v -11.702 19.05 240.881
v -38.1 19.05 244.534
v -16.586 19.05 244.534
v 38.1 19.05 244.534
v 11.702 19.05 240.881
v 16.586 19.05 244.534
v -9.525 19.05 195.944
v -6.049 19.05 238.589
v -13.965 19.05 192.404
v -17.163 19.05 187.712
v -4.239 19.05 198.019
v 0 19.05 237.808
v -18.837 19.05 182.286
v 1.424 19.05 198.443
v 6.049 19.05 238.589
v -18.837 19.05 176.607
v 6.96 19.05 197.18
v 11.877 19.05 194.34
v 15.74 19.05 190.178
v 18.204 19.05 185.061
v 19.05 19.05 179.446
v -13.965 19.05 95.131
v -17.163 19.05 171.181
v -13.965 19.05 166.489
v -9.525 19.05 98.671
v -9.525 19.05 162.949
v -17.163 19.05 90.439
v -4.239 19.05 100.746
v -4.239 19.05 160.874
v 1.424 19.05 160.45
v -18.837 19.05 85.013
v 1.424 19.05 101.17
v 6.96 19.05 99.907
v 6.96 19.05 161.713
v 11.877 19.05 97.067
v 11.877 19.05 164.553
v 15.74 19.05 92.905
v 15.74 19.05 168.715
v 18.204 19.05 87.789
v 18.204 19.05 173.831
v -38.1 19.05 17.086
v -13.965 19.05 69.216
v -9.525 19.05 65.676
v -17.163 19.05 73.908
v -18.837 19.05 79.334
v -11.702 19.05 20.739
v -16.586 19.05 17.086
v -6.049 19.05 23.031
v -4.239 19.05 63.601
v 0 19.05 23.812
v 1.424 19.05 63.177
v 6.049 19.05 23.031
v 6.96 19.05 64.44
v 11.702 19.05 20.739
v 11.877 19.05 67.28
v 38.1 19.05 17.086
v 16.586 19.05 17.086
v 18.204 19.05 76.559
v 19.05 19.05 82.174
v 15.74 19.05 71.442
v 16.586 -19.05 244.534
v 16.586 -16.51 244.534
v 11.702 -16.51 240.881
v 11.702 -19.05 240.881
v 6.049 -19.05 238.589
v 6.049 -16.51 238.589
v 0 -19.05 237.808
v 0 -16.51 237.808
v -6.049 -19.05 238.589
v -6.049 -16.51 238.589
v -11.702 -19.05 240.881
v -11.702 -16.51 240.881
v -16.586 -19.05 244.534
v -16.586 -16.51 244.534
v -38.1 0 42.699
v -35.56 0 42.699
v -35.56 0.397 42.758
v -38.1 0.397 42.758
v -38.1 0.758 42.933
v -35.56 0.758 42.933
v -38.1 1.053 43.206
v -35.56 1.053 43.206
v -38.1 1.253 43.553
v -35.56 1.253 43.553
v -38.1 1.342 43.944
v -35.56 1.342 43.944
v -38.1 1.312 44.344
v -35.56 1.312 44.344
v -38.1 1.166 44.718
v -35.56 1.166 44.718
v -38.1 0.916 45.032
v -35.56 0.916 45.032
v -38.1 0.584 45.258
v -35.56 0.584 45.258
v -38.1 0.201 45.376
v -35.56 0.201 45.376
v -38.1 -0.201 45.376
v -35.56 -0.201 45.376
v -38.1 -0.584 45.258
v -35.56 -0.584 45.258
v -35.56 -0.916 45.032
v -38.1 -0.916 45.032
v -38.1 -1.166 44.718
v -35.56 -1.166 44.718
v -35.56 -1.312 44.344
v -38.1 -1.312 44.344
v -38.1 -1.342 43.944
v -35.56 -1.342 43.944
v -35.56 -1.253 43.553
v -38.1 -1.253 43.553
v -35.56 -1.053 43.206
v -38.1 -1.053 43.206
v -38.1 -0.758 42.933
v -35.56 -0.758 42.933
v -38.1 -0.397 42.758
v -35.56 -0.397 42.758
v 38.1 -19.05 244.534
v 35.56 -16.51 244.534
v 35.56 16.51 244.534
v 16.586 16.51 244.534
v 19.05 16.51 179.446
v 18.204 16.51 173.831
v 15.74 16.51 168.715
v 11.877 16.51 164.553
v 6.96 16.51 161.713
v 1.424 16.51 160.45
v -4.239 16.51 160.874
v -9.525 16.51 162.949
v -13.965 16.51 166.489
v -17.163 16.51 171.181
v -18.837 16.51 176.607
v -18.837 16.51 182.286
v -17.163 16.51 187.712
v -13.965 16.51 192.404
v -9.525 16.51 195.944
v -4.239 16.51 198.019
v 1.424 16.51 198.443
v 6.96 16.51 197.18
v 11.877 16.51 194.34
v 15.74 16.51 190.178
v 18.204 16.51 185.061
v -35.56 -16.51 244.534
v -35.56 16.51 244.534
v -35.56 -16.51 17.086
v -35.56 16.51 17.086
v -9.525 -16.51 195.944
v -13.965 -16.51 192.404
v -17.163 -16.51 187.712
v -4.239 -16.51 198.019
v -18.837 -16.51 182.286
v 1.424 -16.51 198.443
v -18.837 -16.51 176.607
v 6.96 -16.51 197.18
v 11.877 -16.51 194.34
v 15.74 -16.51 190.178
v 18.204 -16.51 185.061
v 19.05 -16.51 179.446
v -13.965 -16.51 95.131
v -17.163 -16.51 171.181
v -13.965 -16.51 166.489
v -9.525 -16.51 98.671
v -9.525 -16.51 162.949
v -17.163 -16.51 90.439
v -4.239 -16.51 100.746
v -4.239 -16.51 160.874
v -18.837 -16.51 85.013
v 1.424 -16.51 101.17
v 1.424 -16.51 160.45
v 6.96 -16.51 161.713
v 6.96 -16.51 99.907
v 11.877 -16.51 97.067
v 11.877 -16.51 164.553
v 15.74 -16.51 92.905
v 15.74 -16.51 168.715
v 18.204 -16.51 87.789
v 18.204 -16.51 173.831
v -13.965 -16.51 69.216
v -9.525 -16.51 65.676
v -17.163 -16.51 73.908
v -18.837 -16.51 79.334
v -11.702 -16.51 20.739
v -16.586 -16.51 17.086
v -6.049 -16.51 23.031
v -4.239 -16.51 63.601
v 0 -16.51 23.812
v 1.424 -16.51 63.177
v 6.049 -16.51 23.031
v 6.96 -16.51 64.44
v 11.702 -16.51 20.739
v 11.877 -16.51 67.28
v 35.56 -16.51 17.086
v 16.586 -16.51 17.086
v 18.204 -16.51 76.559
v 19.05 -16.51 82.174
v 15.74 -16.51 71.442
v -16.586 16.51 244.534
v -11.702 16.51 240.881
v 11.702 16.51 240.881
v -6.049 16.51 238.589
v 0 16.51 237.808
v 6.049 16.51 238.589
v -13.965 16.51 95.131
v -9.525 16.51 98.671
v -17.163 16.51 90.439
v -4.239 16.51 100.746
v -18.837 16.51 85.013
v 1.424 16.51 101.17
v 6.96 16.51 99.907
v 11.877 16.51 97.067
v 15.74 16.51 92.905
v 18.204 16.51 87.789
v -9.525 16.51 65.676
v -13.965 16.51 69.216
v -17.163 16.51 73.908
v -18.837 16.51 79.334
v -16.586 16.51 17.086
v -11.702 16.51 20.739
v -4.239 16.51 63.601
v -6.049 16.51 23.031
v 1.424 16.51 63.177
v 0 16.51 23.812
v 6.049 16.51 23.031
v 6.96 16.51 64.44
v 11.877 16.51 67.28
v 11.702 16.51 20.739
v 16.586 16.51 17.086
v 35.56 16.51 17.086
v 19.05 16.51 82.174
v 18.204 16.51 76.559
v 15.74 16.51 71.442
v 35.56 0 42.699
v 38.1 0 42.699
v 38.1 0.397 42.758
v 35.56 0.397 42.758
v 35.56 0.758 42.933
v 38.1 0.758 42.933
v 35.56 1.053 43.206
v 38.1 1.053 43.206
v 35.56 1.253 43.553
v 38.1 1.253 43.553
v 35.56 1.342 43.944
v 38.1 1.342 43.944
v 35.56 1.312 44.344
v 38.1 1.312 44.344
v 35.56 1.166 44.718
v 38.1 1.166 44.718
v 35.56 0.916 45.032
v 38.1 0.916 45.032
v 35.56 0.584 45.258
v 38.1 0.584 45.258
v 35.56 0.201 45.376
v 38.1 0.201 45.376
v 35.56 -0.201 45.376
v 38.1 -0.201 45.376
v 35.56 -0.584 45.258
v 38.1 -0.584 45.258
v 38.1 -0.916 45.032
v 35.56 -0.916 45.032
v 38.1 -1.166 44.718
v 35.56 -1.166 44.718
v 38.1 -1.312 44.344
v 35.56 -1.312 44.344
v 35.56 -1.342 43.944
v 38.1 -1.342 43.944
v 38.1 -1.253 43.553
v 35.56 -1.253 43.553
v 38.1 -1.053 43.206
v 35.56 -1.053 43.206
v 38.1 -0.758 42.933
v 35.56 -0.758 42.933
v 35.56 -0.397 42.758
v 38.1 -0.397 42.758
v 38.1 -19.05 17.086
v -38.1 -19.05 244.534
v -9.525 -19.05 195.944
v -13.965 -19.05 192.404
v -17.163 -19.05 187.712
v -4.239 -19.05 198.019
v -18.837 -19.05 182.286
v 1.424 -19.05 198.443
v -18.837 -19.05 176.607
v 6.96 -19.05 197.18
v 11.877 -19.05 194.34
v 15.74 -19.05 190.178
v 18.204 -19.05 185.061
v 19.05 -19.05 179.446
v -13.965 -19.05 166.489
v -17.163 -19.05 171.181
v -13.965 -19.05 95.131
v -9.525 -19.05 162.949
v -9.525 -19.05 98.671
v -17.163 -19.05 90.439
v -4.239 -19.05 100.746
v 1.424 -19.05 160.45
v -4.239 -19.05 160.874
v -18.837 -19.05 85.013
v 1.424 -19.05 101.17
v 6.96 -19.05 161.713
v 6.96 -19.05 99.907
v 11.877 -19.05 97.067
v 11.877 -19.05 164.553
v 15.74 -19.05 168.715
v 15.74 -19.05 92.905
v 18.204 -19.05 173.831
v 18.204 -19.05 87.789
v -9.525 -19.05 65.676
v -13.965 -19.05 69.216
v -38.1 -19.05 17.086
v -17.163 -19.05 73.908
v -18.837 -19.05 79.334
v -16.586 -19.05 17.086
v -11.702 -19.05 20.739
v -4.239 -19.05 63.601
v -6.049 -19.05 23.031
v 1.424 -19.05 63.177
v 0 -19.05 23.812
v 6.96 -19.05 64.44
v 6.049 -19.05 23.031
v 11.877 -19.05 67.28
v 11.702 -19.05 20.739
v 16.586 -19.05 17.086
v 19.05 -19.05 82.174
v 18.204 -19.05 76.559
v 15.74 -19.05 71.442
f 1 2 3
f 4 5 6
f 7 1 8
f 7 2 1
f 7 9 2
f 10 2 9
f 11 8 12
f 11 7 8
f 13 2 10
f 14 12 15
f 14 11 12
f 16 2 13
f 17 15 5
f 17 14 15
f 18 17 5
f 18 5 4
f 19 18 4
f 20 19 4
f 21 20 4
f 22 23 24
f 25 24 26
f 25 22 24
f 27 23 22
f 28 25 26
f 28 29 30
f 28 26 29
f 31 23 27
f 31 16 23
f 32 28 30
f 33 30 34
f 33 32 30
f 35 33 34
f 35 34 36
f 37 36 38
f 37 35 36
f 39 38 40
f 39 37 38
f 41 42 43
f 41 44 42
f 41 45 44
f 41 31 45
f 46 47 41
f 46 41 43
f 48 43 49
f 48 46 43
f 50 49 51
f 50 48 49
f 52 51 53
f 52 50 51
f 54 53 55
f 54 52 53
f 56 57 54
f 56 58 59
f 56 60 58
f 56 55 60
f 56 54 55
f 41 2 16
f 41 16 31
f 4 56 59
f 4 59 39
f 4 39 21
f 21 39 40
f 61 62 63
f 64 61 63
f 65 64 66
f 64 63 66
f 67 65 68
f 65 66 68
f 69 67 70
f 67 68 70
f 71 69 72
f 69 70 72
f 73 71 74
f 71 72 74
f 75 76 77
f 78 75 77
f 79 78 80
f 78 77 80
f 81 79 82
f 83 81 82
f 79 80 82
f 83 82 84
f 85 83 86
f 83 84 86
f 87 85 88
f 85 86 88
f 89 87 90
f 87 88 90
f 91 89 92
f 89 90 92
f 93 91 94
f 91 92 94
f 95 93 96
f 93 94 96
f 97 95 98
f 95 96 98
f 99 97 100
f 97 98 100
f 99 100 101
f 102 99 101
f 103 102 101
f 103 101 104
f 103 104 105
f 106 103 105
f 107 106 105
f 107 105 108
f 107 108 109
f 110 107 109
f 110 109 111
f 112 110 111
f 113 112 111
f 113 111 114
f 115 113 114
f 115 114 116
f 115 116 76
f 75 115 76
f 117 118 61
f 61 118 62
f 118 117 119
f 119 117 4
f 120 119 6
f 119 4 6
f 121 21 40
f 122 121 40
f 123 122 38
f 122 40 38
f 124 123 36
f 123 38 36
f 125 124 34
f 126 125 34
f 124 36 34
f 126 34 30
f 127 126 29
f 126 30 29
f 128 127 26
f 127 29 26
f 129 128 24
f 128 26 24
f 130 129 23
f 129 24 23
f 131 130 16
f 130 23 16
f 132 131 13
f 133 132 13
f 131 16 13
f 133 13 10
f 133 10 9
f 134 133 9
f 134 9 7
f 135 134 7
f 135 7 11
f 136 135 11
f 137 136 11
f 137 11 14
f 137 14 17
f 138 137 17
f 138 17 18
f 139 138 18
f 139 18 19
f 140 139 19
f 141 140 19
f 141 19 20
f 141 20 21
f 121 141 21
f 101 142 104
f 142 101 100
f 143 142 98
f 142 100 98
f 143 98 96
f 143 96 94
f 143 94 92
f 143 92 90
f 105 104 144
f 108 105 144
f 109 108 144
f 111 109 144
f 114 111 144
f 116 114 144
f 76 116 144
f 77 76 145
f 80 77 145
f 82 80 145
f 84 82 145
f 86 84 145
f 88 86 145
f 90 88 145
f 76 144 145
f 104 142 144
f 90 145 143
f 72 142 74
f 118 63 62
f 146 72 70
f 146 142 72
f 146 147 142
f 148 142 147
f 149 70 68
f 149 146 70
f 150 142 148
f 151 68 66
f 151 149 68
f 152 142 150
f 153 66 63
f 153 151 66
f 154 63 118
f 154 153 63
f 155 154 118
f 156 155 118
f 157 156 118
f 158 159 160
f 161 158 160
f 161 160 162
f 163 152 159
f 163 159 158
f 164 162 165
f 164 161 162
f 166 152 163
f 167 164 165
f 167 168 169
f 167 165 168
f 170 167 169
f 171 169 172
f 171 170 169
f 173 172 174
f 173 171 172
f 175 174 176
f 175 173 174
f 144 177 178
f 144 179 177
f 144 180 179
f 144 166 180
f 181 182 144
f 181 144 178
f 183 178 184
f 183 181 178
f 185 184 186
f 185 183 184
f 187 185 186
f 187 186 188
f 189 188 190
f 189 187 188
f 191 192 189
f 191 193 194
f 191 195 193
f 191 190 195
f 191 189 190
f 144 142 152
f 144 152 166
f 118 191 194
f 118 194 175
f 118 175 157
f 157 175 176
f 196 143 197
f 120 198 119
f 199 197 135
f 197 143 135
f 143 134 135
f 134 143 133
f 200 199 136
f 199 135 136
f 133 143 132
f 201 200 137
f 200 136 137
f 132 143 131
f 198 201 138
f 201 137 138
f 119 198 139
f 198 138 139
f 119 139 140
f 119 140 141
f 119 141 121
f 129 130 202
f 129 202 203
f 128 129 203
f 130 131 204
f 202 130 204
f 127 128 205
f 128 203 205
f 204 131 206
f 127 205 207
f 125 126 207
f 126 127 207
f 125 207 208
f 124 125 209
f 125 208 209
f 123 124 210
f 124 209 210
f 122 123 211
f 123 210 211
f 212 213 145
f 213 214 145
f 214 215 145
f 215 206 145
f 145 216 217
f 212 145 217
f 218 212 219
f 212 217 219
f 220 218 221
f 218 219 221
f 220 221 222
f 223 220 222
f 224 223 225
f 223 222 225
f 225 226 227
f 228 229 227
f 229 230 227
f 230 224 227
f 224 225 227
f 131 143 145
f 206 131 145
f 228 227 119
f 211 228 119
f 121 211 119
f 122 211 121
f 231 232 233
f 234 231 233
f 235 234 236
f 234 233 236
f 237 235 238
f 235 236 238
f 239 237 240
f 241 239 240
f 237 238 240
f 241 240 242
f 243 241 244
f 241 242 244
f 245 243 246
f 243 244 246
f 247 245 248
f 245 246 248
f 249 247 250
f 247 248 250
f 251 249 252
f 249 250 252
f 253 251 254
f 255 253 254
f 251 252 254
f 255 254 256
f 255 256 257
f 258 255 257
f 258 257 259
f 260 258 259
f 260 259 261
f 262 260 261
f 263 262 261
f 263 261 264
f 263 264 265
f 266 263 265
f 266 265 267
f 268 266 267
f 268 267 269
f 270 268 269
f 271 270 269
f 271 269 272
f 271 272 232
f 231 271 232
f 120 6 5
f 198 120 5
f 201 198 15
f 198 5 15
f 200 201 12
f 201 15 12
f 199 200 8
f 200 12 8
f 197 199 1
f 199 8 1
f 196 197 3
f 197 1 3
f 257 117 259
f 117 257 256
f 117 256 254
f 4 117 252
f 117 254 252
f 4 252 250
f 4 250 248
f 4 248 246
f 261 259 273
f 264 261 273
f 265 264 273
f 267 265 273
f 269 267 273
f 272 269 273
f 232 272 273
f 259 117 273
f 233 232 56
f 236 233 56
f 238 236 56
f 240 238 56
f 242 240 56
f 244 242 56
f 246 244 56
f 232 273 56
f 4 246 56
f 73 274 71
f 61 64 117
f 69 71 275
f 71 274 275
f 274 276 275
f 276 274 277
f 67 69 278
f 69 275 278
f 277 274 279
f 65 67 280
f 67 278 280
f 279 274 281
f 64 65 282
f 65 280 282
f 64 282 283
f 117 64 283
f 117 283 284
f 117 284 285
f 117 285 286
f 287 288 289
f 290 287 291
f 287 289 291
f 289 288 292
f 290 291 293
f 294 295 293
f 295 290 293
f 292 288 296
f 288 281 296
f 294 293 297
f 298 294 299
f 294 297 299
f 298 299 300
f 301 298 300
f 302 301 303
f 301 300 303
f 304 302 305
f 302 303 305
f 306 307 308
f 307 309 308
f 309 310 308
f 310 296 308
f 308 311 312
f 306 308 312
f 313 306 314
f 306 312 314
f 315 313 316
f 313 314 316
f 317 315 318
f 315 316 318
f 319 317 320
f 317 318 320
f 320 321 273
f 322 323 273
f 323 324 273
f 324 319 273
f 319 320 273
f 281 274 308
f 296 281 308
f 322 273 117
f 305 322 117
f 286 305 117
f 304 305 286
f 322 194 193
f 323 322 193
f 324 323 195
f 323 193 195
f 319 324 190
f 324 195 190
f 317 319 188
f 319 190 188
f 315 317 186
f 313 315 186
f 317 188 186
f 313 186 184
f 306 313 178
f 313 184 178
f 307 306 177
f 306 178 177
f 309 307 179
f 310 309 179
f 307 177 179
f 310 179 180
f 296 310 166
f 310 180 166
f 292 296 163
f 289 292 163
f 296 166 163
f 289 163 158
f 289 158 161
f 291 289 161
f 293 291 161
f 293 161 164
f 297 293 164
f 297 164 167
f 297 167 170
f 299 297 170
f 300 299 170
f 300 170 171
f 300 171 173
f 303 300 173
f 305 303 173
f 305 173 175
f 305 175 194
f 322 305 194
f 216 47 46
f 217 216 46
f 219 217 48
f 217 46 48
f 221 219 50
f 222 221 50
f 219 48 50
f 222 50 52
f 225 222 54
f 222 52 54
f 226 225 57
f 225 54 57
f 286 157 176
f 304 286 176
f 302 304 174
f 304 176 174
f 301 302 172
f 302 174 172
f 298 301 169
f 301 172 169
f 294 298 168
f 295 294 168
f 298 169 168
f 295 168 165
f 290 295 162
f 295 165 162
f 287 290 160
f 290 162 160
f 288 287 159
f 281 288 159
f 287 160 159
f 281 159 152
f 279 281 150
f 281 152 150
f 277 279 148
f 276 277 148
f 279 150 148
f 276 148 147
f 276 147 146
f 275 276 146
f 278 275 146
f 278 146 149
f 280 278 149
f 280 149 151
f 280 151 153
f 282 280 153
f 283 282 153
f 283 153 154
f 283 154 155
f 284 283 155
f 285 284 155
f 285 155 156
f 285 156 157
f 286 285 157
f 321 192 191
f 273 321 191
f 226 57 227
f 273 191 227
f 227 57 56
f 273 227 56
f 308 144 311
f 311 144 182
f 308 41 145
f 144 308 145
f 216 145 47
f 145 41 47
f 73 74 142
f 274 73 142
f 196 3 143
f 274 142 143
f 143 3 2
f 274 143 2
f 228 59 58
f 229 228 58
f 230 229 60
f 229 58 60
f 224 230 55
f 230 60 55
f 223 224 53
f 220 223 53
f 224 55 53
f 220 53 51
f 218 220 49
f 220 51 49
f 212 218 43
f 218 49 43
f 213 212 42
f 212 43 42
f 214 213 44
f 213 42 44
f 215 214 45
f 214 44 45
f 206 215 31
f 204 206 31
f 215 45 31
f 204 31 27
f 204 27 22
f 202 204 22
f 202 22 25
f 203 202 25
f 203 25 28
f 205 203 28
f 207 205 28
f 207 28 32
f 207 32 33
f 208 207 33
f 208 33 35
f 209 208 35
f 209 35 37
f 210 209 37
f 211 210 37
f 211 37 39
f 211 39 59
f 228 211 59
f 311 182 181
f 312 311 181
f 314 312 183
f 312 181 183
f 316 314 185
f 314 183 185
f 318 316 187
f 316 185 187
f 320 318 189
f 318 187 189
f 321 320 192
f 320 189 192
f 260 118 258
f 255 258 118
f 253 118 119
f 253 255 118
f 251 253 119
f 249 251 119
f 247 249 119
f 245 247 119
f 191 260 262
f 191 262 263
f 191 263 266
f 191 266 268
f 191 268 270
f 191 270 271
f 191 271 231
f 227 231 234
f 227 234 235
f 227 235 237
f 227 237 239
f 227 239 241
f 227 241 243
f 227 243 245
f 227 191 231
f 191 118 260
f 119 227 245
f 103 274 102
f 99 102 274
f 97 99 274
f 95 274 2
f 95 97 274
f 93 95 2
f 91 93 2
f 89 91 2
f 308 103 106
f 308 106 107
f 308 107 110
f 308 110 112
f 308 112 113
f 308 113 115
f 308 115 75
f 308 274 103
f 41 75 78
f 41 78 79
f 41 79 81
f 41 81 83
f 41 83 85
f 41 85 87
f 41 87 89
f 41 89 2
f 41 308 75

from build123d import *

# Parameters (mm, degrees)
SKETCH1_W           = 76.2
SKETCH1_H           = 38.1
SKETCH1_W_2         = 71.12
SKETCH1_H_2         = 33.02
EXTRUDE_THIN1_DEPTH = 261.62
CUT_EXTRUDE2_DEPTH  = 39.1
SKETCH4_R           = 19.05
CUT_EXTRUDE3_DEPTH  = 39.1
SKETCH5_R           = 1.3462
CUT_EXTRUDE6_DEPTH  = 77.2


with BuildPart() as part:
    # Sketch1 → Extrude-Thin1 (new body)
    with BuildSketch(Plane.XY):
        Rectangle(SKETCH1_W, SKETCH1_H)
        Rectangle(SKETCH1_W_2, SKETCH1_H_2, mode=Mode.SUBTRACT)
    extrude(amount=EXTRUDE_THIN1_DEPTH)

    # Sketch3 → Cut-Extrude2 (cut, through all)
    with BuildSketch(Plane(origin=(0, 19.05, 0), x_dir=(1, 0, 0), z_dir=(0, 1, 0))):
        with BuildLine():
            ThreePointArc((23.8125, -261.62), (21.931629786, -252.344291339), (16.586146516, -244.53389746))
            ThreePointArc((16.586146516, -244.53389746), (0, -237.8075), (-16.586146516, -244.53389746))
            ThreePointArc((-16.586146516, -244.53389746), (-21.931629786, -252.344291339), (-23.8125, -261.62))
            Line((-23.8125, -261.62), (23.8125, -261.62))
        make_face()
        with BuildLine():
            ThreePointArc((-23.8125, -261.62), (0, -285.4325), (23.8125, -261.62))
            Line((23.8125, -261.62), (-23.8125, -261.62))
        make_face()
        with BuildLine():
            Line((38.1, -261.62), (38.1, -244.53389746))
            Line((38.1, -244.53389746), (16.586146516, -244.53389746))
            ThreePointArc((16.586146516, -244.53389746), (21.931629786, -252.344291339), (23.8125, -261.62))
            Line((23.8125, -261.62), (38.1, -261.62))
        make_face()
        with BuildLine():
            ThreePointArc((-23.8125, -261.62), (-21.931629786, -252.344291339), (-16.586146516, -244.53389746))
            Line((-16.586146516, -244.53389746), (-38.1, -244.53389746))
            Line((-38.1, -244.53389746), (-38.1, -261.62))
            Line((-38.1, -261.62), (-23.8125, -261.62))
        make_face()
        with BuildLine():
            ThreePointArc((-16.586146516, -17.08610254), (0, -23.8125), (16.586146516, -17.08610254))
            ThreePointArc((16.586146516, -17.08610254), (21.931629786, -9.275708661), (23.8125, 0))
            Line((23.8125, 0), (-23.8125, 0))
            ThreePointArc((-23.8125, 0), (-21.931629786, -9.275708661), (-16.586146516, -17.08610254))
        make_face()
        with BuildLine():
            Line((-23.8125, 0), (23.8125, 0))
            ThreePointArc((23.8125, 0), (0, 23.8125), (-23.8125, 0))
        make_face()
        with BuildLine():
            Line((-38.1, -17.08610254), (-16.586146516, -17.08610254))
            ThreePointArc((-16.586146516, -17.08610254), (-21.931629786, -9.275708661), (-23.8125, 0))
            Line((-23.8125, 0), (-38.1, 0))
            Line((-38.1, 0), (-38.1, -17.08610254))
        make_face()
        with BuildLine():
            Line((16.586146516, -17.08610254), (38.1, -17.08610254))
            Line((38.1, -17.08610254), (38.1, 0))
            Line((38.1, 0), (23.8125, 0))
            ThreePointArc((23.8125, 0), (21.931629786, -9.275708661), (16.586146516, -17.08610254))
        make_face()
    extrude(amount=-CUT_EXTRUDE2_DEPTH, mode=Mode.SUBTRACT)

    # Sketch4 → Cut-Extrude3 (cut, through all)
    with BuildSketch(Plane(origin=(0, 19.05, 0), x_dir=(1, 0, 0), z_dir=(0, 1, 0))):
        with Locations((0, -179.44639746)):
            Circle(SKETCH4_R)
        with Locations((0, -82.17360254)):
            Circle(SKETCH4_R)
    extrude(amount=-CUT_EXTRUDE3_DEPTH, mode=Mode.SUBTRACT)

    # Sketch5 → Cut-Extrude6 (cut, through all)
    with BuildSketch(Plane(origin=(38.1, 0, 0), x_dir=(0, 0, -1), z_dir=(1, 0, 0))):
        with Locations((-44.044847153, 0)):
            Circle(SKETCH5_R)
    extrude(amount=-CUT_EXTRUDE6_DEPTH, mode=Mode.SUBTRACT)


solid = part.part
